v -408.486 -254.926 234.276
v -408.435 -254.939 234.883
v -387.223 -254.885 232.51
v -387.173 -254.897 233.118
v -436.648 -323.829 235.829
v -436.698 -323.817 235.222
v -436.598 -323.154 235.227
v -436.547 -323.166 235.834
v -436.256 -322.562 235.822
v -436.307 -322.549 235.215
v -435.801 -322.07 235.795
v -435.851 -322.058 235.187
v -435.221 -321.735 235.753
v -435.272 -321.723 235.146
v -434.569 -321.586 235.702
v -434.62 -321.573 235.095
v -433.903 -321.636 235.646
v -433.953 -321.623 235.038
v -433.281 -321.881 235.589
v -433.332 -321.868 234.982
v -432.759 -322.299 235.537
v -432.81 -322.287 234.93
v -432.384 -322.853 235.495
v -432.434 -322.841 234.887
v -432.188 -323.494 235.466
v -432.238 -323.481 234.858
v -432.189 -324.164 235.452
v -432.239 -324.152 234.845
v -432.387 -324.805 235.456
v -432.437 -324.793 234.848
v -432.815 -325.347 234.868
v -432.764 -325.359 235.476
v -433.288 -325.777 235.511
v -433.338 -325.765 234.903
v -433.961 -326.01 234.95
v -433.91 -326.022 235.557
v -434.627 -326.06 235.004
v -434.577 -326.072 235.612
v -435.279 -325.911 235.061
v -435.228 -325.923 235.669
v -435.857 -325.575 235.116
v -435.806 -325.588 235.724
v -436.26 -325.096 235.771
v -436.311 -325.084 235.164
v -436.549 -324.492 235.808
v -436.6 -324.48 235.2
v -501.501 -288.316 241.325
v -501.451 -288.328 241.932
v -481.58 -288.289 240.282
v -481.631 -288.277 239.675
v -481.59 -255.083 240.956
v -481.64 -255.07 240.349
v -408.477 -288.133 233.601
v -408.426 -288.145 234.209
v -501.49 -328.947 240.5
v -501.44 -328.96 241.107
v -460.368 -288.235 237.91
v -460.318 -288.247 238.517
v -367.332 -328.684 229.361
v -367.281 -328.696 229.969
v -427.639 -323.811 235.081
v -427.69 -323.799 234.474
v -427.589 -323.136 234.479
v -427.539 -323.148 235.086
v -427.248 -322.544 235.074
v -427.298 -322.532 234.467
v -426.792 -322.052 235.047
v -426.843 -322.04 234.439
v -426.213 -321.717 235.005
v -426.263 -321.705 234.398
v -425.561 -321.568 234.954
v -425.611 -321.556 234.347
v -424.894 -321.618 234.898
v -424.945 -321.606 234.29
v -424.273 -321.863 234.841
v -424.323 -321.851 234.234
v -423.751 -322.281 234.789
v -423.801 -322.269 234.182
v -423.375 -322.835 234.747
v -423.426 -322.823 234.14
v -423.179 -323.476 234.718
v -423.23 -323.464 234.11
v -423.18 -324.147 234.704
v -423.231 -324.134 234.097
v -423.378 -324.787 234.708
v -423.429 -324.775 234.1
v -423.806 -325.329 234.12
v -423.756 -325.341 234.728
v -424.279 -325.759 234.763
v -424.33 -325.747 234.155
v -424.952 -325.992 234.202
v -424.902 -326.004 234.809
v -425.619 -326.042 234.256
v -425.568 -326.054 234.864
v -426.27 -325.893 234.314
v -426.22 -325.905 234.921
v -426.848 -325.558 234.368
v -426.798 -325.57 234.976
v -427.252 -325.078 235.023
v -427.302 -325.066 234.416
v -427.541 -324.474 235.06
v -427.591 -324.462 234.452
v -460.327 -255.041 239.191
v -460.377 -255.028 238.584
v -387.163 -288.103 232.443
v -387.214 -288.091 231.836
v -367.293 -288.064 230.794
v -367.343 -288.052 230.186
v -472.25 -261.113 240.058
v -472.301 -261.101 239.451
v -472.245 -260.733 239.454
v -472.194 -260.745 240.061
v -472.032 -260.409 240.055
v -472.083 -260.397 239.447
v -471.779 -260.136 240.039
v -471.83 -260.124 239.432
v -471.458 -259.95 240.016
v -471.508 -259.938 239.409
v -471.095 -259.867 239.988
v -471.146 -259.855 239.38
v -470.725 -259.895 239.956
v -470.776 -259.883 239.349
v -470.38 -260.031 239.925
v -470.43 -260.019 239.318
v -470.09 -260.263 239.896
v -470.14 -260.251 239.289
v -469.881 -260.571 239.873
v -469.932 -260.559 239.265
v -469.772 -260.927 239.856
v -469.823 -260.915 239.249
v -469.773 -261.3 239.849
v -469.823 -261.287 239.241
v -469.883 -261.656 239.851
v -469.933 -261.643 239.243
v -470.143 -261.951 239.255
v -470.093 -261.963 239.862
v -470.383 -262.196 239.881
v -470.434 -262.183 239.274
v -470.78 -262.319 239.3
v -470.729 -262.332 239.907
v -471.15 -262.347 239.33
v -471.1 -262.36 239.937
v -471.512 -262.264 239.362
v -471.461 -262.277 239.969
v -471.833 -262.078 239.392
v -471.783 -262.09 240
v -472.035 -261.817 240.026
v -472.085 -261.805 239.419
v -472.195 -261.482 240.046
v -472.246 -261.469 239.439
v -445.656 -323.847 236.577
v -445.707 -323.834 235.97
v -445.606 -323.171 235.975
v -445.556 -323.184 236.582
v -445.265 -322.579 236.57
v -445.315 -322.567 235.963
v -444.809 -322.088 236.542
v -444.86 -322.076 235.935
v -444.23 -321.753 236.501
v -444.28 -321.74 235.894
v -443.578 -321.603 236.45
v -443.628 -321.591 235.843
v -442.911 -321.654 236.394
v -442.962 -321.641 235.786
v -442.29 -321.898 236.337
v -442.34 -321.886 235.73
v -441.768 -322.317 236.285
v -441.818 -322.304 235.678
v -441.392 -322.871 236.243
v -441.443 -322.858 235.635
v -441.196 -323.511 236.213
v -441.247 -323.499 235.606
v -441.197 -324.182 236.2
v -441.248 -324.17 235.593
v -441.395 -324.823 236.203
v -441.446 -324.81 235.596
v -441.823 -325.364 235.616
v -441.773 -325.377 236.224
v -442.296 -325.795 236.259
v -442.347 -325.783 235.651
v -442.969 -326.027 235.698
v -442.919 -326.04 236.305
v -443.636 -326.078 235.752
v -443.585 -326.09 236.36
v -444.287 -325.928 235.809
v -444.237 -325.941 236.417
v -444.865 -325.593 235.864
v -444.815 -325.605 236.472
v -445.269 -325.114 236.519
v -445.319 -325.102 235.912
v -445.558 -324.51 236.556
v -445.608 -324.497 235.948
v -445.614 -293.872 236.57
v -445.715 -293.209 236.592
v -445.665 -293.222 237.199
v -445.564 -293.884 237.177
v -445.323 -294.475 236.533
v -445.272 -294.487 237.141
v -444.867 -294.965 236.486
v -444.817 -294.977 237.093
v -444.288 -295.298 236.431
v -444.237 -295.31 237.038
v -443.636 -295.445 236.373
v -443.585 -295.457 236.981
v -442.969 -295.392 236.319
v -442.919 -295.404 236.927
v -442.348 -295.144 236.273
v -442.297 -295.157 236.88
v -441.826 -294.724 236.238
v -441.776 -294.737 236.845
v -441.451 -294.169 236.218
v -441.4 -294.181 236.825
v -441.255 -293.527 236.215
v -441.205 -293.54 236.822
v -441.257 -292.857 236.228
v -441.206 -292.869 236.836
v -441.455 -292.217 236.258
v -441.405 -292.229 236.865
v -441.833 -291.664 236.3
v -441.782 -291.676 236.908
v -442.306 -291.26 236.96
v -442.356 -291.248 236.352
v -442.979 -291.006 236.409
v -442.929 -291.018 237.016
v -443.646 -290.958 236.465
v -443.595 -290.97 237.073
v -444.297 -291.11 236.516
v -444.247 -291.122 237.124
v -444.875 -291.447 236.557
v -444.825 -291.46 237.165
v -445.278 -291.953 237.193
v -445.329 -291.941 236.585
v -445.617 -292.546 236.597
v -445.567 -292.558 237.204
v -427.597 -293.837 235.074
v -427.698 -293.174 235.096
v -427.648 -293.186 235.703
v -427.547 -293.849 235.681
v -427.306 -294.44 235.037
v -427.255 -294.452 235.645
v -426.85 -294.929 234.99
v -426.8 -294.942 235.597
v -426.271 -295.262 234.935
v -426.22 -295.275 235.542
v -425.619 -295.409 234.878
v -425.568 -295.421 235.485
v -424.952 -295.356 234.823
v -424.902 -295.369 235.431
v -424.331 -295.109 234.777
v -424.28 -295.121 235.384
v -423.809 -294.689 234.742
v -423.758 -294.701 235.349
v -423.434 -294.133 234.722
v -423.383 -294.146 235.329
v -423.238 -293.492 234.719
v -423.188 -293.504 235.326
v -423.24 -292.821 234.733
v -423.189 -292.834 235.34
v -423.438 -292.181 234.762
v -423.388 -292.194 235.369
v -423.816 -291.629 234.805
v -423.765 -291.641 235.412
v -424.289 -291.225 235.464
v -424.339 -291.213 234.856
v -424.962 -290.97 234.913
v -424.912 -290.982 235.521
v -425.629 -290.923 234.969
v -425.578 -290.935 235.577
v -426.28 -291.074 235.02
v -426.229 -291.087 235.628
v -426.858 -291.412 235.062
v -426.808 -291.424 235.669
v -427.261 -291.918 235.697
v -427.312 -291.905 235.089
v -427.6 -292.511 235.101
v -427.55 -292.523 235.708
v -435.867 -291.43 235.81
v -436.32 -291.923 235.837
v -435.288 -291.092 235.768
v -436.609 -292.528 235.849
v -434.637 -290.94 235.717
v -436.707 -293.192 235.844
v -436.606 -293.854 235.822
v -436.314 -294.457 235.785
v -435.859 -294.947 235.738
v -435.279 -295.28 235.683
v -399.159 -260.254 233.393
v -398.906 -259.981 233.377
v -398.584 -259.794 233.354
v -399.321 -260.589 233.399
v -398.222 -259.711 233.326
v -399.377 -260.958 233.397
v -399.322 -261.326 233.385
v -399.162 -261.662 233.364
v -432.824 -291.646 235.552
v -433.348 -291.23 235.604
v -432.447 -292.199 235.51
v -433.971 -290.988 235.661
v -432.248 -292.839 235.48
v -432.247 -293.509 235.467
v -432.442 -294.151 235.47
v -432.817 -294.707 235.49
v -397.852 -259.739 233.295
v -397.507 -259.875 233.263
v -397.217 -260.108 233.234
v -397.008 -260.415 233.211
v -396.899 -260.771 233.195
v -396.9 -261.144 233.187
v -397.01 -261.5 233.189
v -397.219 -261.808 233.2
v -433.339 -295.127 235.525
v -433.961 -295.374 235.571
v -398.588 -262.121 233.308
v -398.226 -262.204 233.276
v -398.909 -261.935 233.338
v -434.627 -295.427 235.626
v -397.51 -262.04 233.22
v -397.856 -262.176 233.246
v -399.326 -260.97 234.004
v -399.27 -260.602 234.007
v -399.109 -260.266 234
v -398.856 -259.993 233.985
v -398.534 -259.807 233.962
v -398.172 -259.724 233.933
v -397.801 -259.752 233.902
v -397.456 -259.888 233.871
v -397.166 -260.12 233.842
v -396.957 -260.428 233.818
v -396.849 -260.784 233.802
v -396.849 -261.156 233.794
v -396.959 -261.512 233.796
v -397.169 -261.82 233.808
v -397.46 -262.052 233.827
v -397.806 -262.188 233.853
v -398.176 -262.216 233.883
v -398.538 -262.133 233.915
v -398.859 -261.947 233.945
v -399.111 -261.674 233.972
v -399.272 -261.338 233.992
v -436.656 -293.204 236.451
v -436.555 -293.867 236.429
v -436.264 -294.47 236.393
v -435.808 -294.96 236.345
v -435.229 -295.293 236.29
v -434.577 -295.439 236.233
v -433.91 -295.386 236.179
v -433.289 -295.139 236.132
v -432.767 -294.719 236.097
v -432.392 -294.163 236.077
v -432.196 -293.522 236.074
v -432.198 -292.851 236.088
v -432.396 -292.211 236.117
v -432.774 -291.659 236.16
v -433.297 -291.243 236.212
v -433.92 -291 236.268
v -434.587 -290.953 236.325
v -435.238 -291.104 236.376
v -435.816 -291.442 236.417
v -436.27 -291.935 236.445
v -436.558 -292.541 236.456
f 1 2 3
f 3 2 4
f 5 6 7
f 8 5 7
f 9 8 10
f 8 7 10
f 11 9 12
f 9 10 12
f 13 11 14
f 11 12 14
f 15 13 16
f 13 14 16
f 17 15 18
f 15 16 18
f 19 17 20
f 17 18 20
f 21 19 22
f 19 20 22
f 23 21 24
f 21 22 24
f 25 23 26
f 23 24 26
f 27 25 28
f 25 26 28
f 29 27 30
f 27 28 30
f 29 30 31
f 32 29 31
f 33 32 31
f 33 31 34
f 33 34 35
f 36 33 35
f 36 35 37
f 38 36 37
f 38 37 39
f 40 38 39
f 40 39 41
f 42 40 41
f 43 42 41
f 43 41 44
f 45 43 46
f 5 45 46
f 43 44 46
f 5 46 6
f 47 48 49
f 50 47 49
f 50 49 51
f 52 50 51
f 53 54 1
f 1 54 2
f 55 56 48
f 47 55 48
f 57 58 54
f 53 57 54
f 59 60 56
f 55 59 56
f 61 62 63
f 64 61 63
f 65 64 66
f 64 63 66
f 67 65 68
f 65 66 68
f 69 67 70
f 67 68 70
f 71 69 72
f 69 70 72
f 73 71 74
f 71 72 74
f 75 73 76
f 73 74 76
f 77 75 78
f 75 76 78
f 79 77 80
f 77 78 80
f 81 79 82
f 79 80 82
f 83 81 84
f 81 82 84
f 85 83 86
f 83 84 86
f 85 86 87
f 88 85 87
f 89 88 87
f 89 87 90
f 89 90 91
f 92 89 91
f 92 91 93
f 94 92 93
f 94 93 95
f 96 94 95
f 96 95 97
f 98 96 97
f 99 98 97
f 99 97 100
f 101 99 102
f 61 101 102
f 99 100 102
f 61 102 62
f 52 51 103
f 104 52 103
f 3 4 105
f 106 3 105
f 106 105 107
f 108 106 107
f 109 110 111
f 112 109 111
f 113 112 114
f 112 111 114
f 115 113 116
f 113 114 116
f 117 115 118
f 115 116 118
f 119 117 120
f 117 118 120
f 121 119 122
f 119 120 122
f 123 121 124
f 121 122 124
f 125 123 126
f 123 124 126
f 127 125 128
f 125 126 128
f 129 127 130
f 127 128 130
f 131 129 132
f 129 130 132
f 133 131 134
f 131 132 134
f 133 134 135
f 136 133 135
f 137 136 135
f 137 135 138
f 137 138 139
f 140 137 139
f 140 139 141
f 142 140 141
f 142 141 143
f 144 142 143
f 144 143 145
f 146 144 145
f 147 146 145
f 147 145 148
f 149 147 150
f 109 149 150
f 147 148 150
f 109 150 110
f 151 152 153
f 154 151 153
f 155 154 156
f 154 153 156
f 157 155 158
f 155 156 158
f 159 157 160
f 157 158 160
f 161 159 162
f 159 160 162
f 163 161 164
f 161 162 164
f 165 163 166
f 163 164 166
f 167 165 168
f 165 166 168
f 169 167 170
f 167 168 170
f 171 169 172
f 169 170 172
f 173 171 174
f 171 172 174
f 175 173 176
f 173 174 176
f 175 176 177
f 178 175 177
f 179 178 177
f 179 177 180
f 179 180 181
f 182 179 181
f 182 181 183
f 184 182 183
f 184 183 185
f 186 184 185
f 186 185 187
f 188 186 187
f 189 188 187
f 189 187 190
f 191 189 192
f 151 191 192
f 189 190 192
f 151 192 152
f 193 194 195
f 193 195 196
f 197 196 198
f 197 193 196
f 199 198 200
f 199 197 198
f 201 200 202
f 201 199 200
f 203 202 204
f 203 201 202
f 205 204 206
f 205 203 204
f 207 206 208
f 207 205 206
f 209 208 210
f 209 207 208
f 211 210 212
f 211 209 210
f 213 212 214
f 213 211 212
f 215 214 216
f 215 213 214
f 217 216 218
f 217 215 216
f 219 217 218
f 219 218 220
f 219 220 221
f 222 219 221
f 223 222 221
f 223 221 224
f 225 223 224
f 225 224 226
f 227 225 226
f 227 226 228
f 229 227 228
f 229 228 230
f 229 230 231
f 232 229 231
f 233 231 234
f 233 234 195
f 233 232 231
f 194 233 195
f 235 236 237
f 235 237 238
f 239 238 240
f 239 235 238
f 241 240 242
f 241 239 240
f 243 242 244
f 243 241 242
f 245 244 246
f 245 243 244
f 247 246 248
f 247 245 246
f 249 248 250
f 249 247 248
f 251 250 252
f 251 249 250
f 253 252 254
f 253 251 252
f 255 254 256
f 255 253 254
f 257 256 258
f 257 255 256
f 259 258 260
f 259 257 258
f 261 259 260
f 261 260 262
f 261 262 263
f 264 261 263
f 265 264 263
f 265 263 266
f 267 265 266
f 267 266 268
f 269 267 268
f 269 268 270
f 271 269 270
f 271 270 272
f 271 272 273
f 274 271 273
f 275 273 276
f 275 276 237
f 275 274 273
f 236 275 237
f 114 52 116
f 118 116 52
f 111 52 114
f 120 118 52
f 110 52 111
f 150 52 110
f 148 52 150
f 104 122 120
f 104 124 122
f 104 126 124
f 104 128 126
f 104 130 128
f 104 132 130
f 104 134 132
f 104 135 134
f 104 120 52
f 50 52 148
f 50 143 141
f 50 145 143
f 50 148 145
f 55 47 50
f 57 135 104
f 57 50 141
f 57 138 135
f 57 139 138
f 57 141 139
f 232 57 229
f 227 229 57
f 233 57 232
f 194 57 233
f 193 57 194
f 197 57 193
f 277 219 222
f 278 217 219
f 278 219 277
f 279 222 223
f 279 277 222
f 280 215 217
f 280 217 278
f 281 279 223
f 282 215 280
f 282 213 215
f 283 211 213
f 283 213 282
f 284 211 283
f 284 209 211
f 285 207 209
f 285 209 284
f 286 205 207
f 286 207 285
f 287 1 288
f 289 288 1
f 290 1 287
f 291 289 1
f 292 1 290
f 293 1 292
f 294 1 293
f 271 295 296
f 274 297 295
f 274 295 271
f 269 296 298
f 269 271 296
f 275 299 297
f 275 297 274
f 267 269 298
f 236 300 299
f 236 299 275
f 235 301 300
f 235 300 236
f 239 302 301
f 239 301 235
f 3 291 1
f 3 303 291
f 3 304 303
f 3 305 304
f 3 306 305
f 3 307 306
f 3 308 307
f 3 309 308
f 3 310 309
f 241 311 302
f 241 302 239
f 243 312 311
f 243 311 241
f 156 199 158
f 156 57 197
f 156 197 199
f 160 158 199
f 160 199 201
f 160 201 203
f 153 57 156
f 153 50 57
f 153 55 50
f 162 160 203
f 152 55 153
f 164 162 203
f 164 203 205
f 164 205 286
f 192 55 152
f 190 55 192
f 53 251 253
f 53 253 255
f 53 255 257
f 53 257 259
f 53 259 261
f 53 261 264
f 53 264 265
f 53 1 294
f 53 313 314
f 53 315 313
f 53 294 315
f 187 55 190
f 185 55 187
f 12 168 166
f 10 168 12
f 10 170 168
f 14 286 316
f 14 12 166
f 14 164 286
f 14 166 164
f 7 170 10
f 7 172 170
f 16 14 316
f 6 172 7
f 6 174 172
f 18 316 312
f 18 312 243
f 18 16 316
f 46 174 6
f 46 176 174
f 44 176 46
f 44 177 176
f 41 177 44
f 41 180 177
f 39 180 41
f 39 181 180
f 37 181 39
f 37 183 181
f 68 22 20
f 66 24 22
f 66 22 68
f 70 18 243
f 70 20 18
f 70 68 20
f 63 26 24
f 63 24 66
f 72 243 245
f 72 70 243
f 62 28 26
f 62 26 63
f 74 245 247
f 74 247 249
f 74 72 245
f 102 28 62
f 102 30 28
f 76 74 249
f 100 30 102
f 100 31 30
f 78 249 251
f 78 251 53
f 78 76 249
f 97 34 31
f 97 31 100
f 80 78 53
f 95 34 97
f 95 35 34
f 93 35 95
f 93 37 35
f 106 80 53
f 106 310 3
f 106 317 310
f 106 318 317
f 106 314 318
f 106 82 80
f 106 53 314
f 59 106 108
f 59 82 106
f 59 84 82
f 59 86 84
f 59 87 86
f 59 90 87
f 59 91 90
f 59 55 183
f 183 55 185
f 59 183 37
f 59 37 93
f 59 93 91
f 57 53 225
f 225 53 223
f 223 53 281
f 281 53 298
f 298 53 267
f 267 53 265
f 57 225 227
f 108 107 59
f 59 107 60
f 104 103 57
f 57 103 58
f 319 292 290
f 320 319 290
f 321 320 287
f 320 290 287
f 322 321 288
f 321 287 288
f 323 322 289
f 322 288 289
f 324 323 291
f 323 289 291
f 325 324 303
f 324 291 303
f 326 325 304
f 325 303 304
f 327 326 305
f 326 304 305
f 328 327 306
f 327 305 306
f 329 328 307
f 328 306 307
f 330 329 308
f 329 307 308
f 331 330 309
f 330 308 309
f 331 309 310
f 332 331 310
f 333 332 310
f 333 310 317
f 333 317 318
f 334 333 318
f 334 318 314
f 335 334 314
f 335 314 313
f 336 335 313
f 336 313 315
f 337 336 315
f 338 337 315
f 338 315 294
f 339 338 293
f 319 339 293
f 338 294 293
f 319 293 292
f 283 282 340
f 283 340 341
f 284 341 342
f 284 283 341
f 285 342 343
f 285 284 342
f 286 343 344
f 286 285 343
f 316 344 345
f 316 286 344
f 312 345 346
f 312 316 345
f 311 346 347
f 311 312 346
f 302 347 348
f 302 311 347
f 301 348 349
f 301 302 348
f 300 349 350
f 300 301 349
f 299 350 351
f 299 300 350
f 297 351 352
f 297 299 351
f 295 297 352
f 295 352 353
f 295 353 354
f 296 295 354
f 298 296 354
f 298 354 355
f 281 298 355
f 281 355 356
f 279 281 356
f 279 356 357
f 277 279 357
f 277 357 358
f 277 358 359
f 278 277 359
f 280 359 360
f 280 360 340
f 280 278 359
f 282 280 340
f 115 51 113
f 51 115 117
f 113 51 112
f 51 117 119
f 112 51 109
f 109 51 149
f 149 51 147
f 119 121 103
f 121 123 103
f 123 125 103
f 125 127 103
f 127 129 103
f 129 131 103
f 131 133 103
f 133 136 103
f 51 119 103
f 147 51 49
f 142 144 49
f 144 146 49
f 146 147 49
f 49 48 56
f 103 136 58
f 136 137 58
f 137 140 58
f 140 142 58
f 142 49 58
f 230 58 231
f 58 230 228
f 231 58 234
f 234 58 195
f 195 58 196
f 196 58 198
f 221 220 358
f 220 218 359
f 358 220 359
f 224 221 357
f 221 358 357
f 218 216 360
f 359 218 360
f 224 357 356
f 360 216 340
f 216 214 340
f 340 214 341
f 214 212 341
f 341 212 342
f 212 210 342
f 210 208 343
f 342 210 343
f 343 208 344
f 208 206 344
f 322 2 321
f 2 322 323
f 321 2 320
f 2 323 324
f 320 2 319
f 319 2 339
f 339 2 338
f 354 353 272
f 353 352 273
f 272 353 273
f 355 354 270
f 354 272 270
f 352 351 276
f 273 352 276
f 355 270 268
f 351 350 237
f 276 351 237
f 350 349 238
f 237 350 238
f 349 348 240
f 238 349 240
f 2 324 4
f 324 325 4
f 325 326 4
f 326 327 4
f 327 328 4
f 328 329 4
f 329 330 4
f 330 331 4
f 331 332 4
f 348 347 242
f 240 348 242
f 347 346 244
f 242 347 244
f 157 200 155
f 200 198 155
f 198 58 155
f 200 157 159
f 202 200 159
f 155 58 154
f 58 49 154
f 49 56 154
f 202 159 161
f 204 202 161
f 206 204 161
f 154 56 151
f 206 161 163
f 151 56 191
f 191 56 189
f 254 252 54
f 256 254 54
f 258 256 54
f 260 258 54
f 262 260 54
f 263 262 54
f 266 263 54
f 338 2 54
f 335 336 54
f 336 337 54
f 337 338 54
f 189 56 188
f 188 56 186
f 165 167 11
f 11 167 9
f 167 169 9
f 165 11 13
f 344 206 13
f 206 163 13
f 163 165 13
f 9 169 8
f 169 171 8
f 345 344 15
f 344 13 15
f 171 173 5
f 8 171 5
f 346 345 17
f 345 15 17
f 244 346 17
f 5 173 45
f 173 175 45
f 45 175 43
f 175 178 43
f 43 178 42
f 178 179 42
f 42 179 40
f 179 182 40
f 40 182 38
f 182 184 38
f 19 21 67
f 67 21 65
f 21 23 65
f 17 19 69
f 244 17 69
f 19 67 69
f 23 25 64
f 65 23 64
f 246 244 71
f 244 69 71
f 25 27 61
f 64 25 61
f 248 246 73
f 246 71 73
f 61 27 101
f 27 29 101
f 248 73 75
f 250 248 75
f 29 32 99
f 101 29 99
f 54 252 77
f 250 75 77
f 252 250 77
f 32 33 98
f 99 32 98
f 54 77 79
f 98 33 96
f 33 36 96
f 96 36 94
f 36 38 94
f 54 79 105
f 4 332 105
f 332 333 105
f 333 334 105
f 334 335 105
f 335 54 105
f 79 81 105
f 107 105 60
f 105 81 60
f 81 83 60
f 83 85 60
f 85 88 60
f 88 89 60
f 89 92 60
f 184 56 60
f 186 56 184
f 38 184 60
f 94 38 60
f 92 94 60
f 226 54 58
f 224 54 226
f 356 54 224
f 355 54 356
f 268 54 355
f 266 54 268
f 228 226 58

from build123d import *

# Parameters (mm, degrees)
BOSS_EXTRUDE1_DEPTH = 0.6096
SKETCH5_R           = 2.25
CUT_EXTRUDE2_DEPTH  = 0.6096
SKETCH6_R           = 1.25
CUT_EXTRUDE5_DEPTH  = 0.6096
SKETCH7_R           = 1.25
CUT_EXTRUDE6_DEPTH  = 0.6096


with BuildPart() as part:
    # Sketch1 → Boss-Extrude1 (new body)
    with BuildSketch(Plane(origin=(16.997226787, -4.149929847, 204.631375634), x_dir=(0.9965694099183702, 0.001959509651517015, -0.0827379691367708), z_dir=(-0.08276069418699705, 0.02020630066742911, -0.9963645783100802))):
        Polygon((-405.631572024, 283.216979703), (-385.692572024, 283.216979703), (-385.692572024, 323.856979703), (-405.014358213, 323.856979703), (-432.414358217, 323.856979703), (-445.097076418, 323.856979703), (-465.359895626, 323.856979703), (-479.498480719, 323.856979703), (-500.373572024, 323.856979703), (-520.312572024, 323.856979703), (-520.312572024, 283.216979703), (-500.373572024, 283.216979703), (-500.373572024, 250.003685703), (-479.037572024, 250.003685703), (-479.037572024, 283.216979703), (-426.967572024, 283.216979703), (-426.967572024, 250.003685703), (-405.631572024, 250.003685703), align=None)
    extrude(amount=BOSS_EXTRUDE1_DEPTH)

    # Sketch5 → Cut-Extrude2 (cut)
    with BuildSketch(Plane(origin=(16.946775868, -4.137612086, 204.023991787), x_dir=(-0.9965694494101686, -0.0016780440853138524, 0.08274368054637986), z_dir=(-0.08276069418699686, 0.020206300667429084, -0.9963645783100801))):
        with Locations(Location((461.99617795, -318.987055127, 0), (0, 0, 0.096164523))):
            Circle(SKETCH5_R)
        with Locations(Location((452.956635294, -318.984510283, 0), (0, 0, 0.096164523))):
            Circle(SKETCH5_R)
        with Locations(Location((443.917092638, -318.981965439, 0), (0, 0, 0.096164523))):
            Circle(SKETCH5_R)
    cut_extrude2 = extrude(amount=-CUT_EXTRUDE2_DEPTH, mode=Mode.SUBTRACT)

    # Mirror1: Cut-Extrude2 across plane
    add(cut_extrude2.mirror(Plane(origin=(0.085159645, -303.474424262, -6.16154314), x_dir=(5.696257509048786e-06, -0.02029915071256955, 0.9997939509958544), z_dir=(0.00028055772663953236, -0.9997939116314238, -0.02029915151179877))), mode=Mode.SUBTRACT)

    # Sketch6 → Cut-Extrude5 (cut)
    with BuildSketch(Plane(origin=(16.946775868, -4.137612086, 204.023991787), x_dir=(-0.9965694494101686, -0.0016780440853136297, 0.08274368054637984), z_dir=(-0.08276069418699684, 0.0202063006674291, -0.9963645783100802))):
        with Locations(Location((416.50680125, -256.173836565, 0), (0, 0, 0.096164523))):
            Circle(SKETCH6_R)
    extrude(amount=-CUT_EXTRUDE5_DEPTH, mode=Mode.SUBTRACT)

    # Sketch7 → Cut-Extrude6 (cut)
    with BuildSketch(Plane(origin=(16.946775868, -4.137612086, 204.023991787), x_dir=(-0.9965694494101686, -0.0016780440853141855, 0.08274368054637984), z_dir=(-0.08276069418699686, 0.020206300667429067, -0.9963645783100802))):
        with Locations(Location((489.681466673, -256.194436956, 0), (0, 0, 0.096164523))):
            Circle(SKETCH7_R)
    extrude(amount=-CUT_EXTRUDE6_DEPTH, mode=Mode.SUBTRACT)


solid = part.part
